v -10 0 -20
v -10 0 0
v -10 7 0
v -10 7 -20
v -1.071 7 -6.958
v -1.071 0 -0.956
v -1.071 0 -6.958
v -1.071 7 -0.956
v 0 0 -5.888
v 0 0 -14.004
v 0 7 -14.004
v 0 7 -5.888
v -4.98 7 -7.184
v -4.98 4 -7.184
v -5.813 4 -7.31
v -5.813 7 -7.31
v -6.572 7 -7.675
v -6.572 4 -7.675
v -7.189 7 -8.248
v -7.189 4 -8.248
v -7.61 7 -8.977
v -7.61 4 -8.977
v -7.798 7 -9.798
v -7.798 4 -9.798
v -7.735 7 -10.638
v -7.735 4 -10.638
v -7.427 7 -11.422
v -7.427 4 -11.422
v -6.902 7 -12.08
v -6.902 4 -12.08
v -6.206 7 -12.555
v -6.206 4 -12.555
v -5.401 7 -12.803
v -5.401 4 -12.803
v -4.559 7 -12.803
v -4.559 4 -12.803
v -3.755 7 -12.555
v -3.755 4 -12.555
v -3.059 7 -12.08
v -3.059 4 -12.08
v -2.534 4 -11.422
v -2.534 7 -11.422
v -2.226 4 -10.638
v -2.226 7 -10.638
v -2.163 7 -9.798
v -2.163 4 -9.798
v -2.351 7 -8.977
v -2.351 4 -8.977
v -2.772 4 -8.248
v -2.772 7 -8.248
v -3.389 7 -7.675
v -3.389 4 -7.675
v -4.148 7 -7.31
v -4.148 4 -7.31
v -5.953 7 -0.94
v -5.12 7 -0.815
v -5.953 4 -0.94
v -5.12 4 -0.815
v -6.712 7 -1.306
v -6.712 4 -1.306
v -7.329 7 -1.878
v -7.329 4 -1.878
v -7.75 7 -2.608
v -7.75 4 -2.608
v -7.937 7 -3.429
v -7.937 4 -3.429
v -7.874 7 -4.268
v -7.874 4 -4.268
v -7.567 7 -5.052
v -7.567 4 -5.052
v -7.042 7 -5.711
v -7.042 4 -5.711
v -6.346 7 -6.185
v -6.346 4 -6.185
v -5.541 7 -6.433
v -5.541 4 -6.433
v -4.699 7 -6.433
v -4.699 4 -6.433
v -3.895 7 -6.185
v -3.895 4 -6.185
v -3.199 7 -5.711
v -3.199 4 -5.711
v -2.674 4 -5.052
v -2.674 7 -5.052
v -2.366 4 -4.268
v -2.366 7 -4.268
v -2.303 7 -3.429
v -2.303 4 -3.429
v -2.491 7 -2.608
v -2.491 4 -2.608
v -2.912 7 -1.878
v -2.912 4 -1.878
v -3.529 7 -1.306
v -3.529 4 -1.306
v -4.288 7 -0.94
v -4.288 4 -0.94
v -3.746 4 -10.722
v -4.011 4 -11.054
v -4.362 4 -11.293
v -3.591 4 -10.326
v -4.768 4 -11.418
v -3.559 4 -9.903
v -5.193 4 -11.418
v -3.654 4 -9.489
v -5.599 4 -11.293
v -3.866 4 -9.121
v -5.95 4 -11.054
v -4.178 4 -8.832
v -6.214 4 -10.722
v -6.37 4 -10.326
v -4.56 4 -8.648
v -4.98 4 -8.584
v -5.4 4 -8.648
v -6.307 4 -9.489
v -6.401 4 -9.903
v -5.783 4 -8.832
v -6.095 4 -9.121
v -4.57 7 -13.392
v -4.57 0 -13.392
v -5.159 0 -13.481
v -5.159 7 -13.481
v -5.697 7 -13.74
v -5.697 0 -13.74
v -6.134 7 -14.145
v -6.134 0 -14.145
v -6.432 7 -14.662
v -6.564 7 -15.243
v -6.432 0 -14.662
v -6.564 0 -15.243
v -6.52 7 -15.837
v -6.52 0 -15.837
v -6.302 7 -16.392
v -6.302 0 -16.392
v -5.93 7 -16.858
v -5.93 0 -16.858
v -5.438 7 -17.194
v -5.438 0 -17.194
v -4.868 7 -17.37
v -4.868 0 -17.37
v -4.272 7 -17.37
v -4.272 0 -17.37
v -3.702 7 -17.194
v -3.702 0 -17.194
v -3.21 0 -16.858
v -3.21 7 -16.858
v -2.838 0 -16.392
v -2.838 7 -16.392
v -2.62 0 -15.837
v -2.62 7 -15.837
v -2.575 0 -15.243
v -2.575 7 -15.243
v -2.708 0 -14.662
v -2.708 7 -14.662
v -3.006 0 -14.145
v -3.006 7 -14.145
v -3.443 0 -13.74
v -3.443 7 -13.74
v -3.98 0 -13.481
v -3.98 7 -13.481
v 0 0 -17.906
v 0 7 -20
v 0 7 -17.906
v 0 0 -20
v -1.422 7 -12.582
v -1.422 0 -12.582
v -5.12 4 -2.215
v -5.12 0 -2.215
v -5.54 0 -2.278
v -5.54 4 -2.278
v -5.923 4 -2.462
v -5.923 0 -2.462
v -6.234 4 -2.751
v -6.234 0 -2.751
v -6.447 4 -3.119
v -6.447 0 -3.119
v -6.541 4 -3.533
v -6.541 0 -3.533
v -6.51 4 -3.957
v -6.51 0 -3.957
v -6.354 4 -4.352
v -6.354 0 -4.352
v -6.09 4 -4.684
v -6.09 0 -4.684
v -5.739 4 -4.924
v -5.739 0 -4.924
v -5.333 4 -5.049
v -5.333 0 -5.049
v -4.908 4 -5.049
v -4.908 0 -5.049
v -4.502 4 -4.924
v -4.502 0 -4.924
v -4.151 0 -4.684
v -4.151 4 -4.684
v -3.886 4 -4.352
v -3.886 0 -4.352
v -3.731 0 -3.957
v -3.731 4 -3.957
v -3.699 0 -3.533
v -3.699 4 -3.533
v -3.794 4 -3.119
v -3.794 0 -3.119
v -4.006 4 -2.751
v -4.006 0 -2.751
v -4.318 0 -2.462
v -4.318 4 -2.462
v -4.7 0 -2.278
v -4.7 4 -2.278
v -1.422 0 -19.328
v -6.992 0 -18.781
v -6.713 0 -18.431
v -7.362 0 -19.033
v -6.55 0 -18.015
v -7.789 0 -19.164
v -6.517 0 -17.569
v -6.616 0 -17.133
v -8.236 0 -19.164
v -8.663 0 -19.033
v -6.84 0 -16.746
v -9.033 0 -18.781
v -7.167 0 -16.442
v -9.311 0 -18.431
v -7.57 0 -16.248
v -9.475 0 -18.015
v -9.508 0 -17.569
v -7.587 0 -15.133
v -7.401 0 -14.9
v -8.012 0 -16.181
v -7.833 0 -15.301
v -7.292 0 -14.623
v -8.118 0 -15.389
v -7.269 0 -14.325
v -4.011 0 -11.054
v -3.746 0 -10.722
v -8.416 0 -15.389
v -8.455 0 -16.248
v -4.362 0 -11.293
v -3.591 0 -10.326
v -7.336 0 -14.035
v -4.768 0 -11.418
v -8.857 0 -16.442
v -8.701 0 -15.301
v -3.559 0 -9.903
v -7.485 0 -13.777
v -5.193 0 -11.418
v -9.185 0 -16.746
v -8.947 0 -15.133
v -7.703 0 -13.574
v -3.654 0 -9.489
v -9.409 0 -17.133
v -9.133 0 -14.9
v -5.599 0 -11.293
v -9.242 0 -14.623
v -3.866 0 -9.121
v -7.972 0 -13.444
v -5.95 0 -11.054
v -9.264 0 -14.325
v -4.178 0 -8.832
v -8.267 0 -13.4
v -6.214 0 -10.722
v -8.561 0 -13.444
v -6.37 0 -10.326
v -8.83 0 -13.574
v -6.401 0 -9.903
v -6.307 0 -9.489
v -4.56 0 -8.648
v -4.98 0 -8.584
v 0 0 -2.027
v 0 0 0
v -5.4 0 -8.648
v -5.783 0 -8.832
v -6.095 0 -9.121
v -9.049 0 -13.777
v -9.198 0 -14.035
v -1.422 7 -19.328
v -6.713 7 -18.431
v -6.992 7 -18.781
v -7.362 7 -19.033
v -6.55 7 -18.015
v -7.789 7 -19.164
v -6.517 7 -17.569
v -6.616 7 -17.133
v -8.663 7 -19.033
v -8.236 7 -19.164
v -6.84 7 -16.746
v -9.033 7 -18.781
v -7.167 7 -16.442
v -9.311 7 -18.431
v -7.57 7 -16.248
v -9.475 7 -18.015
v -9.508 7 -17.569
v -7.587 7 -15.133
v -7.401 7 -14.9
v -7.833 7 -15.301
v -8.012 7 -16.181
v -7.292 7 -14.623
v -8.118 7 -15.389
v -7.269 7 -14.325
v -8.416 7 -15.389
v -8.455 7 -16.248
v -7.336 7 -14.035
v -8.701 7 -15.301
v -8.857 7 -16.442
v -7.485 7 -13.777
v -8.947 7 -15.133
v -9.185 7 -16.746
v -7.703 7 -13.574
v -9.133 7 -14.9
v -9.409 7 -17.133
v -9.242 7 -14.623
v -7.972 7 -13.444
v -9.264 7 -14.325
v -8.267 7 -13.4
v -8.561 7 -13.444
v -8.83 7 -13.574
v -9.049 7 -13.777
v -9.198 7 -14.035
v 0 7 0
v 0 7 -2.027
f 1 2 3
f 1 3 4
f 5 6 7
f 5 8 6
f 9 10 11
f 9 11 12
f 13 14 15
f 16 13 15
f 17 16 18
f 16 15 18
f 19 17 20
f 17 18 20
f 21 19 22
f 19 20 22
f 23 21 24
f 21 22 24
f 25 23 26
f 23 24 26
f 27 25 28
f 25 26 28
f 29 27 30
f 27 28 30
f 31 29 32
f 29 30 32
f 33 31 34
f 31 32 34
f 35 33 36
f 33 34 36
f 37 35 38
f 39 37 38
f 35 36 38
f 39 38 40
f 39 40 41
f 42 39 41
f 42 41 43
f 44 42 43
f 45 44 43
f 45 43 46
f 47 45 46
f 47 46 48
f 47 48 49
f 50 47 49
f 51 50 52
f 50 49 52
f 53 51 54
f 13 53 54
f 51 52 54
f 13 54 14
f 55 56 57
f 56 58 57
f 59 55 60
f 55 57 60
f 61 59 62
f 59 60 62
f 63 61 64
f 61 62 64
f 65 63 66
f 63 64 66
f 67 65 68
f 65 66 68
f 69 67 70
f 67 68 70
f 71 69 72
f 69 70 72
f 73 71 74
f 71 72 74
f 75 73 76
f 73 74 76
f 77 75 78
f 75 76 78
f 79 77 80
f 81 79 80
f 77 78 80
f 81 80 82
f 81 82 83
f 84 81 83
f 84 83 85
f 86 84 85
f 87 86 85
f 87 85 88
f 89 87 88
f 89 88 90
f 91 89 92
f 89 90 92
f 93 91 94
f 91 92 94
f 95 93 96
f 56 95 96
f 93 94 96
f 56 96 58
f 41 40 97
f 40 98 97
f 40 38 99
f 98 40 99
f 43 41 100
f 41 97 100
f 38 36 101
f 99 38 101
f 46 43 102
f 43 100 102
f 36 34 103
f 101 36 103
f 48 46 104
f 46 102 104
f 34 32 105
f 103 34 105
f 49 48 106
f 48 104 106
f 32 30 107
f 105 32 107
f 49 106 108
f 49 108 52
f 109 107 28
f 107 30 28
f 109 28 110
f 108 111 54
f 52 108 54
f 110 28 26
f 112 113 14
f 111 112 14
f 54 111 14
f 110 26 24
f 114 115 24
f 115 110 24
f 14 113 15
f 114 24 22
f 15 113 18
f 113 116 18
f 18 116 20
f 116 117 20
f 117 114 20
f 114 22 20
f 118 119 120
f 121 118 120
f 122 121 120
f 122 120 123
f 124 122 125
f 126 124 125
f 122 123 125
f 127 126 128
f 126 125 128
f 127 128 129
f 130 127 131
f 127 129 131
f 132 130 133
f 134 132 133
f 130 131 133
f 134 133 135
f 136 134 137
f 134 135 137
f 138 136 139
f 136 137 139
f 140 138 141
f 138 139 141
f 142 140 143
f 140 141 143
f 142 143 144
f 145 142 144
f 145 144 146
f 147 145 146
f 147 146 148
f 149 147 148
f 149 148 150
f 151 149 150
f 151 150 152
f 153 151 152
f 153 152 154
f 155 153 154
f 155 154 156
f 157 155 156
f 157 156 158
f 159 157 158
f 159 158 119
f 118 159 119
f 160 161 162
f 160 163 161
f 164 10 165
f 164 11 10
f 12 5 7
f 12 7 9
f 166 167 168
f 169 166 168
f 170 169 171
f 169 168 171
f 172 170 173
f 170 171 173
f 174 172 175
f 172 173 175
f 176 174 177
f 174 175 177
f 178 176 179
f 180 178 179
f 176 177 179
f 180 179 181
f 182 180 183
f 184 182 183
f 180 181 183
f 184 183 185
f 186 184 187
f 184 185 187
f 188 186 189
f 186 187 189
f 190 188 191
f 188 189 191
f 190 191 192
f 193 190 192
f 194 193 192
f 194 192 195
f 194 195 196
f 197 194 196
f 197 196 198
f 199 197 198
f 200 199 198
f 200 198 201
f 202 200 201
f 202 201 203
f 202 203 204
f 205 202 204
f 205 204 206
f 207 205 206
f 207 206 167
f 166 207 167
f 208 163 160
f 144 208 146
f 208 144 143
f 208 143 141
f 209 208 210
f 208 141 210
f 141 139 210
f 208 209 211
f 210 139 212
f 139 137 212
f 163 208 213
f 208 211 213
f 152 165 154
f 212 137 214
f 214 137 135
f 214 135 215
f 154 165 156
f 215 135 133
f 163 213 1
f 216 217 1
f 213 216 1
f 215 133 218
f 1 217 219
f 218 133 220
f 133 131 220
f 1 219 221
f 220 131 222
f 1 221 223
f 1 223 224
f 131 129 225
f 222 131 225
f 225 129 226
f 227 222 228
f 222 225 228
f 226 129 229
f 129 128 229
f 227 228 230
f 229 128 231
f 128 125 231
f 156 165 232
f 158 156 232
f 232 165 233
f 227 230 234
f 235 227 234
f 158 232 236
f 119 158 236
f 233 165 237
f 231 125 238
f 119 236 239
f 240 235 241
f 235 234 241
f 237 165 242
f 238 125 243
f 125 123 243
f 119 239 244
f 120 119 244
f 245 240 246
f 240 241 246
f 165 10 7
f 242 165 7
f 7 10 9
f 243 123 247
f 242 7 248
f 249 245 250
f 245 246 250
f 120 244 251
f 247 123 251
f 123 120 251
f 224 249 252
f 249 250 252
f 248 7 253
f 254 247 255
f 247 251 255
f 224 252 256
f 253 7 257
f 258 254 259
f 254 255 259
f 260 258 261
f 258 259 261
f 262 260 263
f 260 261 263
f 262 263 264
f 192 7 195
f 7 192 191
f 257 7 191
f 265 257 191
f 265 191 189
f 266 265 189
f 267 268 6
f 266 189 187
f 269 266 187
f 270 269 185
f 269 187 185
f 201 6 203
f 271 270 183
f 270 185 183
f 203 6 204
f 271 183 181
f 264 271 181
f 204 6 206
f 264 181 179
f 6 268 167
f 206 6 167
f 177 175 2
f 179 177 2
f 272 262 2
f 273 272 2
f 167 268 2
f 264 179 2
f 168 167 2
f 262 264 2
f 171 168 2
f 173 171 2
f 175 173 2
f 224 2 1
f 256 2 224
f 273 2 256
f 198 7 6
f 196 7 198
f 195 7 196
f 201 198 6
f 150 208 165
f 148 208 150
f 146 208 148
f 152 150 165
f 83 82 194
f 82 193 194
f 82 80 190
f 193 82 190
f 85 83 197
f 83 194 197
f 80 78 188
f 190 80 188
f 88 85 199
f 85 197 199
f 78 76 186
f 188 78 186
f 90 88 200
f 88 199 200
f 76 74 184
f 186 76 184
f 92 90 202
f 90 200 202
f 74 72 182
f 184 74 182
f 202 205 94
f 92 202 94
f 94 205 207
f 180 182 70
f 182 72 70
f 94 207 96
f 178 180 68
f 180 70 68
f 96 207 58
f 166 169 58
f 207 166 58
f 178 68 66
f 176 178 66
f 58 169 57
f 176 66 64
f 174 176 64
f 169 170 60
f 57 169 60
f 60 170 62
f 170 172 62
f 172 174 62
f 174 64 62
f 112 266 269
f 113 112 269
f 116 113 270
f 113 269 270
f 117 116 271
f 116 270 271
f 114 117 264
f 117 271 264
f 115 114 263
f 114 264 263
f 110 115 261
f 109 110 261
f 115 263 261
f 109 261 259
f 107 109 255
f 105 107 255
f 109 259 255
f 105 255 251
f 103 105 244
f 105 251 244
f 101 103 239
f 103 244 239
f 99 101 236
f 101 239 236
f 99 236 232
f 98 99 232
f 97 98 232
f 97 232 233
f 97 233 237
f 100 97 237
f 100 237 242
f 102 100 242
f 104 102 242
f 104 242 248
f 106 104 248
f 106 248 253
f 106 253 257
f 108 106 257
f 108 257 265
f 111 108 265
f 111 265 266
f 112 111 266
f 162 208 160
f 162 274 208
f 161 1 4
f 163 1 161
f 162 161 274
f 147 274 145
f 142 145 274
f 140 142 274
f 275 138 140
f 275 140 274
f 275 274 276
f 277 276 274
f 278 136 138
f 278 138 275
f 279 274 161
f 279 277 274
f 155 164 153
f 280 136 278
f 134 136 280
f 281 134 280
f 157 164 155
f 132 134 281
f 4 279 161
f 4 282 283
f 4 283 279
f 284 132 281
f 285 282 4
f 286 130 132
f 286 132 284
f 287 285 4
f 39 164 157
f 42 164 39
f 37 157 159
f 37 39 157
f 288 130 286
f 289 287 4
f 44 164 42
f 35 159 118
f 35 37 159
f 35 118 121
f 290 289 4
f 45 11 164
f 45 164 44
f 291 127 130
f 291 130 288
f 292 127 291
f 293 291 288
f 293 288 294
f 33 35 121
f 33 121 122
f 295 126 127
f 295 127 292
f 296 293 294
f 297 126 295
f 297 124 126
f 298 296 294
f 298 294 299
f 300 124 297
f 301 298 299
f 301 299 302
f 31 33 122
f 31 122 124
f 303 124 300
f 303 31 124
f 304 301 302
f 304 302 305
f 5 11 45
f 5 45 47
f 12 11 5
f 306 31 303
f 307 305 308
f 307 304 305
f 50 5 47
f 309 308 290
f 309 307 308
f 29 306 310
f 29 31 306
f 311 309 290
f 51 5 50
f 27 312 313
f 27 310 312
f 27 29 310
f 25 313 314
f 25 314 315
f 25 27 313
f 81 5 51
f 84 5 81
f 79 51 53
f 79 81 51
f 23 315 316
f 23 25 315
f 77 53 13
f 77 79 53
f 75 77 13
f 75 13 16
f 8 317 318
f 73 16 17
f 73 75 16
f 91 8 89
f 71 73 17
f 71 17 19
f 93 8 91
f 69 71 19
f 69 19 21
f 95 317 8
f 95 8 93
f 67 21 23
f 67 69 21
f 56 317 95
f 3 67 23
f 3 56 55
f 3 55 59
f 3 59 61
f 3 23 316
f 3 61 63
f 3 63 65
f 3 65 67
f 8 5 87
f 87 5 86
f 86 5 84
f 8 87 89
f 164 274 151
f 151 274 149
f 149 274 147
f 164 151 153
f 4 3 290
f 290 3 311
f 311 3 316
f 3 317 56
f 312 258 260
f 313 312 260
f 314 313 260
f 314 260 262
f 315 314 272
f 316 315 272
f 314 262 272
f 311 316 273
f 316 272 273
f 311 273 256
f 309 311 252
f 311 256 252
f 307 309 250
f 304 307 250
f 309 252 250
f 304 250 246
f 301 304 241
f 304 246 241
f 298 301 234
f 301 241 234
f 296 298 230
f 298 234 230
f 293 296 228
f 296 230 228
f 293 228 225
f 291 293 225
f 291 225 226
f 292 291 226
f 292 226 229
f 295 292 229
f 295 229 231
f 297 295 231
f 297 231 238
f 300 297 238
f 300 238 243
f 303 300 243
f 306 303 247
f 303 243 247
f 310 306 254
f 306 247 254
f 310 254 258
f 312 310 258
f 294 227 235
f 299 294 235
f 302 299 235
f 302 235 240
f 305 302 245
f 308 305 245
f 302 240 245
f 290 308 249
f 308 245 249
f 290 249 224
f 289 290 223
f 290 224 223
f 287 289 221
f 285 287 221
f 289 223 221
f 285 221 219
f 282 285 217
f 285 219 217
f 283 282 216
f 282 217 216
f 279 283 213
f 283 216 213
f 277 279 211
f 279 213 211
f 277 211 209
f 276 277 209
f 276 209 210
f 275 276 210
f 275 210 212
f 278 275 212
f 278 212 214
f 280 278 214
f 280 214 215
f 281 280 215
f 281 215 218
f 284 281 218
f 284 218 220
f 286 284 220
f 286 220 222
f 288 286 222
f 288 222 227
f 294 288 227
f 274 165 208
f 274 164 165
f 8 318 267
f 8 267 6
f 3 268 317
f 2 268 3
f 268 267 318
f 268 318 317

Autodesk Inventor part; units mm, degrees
ref_plane "YZ Plane" through (0, 0, 0) normal (1, 0, 0) x (0, 1, 0)
ref_plane "XZ Plane" through (0, 0, 0) normal (0, 1, 0) x (-1, 0, 0)
ref_plane "XY Plane" through (0, 0, 0) normal (0, 0, 1) x (1, 0, 0)
sketch "Sketch1" plane through (0, 0, 0) normal (0, 1, 0) x (-1, 0, 0)
  line L0 (0, 0) -> (10, 0)
  line L1 (10, 0) -> (10, -20)
  line L2 (10, -20) -> (0, -20)
  line L3 (0, -20) -> (0, 0)
  dimension "d0" = 10
  dimension "d1" = 20
extrude "Extrusion1" add sketch "Sketch1" along normal blind 7
sketch "Sketch2" plane through (0, 7, 0) normal (0, 1, 0) x (1, 0, 0)
  line L0 (-10, 20) -> (-10, 0) construction
  line L1 (-5, 20) -> (-5, 0) construction
  line L2 (-10, 0) -> (0, 0) construction
  line L3 (-10, 10) -> (0, 10) construction
  line L4 (0, 0) -> (0, 20) construction
sketch "Sketch3" plane through (0, 7, 0) normal (0, 1, 0) x (1, 0, 0)
  point P0 (0, 0)
  point P1 (-5.1203, 3.6397)
hole "Hole1" at (-5.1203, 7, -3.6397) direction (0, -1, 0) diameter 2.85 depth 13.15 counterbore diameter 5.65 counterbore depth 3
sketch "Sketch4" plane through (0, 7, 0) normal (0, 1, 0) x (1, 0, 0)
  point P0 (0, 0)
  point P1 (-4.9804, 10.0094)
hole "Hole2" at (-4.9804, 7, -10.0094) direction (0, -1, 0) diameter 2.85 depth 9.05 counterbore diameter 5.65 counterbore depth 3
sketch "Sketch5" plane through (0, 7, 0) normal (0, 1, 0) x (1, 0, 0)
  point P0 (0, 0)
  point P1 (-8.0124, 17.6811)
hole "Hole3" at (-8.0124, 7, -17.6811) direction (0, -1, 0) diameter 3 end through all
sketch "Sketch6" plane through (0, 7, 0) normal (0, 1, 0) x (1, 0, 0)
  point P0 (0, 0)
  point P1 (-8.2667, 14.4)
hole "Hole4" at (-8.2667, 7, -14.4) direction (0, -1, 0) diameter 2 end through all
sketch "Sketch7" plane through (0, 7, 0) normal (0, 1, 0) x (1, 0, 0)
  point P0 (0, 0)
  point P1 (-4.5699, 15.3923)
hole "Hole5" at (-4.5699, 7, -15.3923) direction (0, -1, 0) diameter 4 end through all
sketch "Sketch8" plane through (0, 7, 0) normal (0, 1, 0) x (1, 0, 0)
  line L0 (0, 0) -> (0, 20) projected
  line L1 (0, 14.0043) -> (-1.4223, 12.582)
  line L2 (-1.4223, 12.582) -> (-1.4223, 19.3282)
  line L3 (-1.4223, 19.3282) -> (0, 17.9058)
  line L4 (0, 14.0043) -> (0, 17.9058)
  dimension "d39" = 45
  dimension "d40" = 45
  dimension "d41" = 6.7462
  dimension "d42" = 1.4223
extrude "Extrusion2" cut sketch "Sketch8" against normal through all
sketch "Sketch9" plane through (0, 7, 0) normal (0, 1, 0) x (1, 0, 0)
  line L0 (0, 14.0043) -> (0, 0) projected
  line L1 (0, 2.0269) -> (-1.0707, 0.9562)
  line L2 (-1.0707, 0.9562) -> (-1.0707, 6.9582)
  line L3 (-1.0707, 6.9582) -> (0, 5.8875)
  dimension "d45" = 45
  dimension "d46" = 45
  dimension "d47" = 6.002
  dimension "d48" = 1.0707
extrude "Extrusion3" cut sketch "Sketch9" against normal blind 7
equation "\"d40\" = d39"
equation "\"d46\" = d45"
properties part number "last_drill"
